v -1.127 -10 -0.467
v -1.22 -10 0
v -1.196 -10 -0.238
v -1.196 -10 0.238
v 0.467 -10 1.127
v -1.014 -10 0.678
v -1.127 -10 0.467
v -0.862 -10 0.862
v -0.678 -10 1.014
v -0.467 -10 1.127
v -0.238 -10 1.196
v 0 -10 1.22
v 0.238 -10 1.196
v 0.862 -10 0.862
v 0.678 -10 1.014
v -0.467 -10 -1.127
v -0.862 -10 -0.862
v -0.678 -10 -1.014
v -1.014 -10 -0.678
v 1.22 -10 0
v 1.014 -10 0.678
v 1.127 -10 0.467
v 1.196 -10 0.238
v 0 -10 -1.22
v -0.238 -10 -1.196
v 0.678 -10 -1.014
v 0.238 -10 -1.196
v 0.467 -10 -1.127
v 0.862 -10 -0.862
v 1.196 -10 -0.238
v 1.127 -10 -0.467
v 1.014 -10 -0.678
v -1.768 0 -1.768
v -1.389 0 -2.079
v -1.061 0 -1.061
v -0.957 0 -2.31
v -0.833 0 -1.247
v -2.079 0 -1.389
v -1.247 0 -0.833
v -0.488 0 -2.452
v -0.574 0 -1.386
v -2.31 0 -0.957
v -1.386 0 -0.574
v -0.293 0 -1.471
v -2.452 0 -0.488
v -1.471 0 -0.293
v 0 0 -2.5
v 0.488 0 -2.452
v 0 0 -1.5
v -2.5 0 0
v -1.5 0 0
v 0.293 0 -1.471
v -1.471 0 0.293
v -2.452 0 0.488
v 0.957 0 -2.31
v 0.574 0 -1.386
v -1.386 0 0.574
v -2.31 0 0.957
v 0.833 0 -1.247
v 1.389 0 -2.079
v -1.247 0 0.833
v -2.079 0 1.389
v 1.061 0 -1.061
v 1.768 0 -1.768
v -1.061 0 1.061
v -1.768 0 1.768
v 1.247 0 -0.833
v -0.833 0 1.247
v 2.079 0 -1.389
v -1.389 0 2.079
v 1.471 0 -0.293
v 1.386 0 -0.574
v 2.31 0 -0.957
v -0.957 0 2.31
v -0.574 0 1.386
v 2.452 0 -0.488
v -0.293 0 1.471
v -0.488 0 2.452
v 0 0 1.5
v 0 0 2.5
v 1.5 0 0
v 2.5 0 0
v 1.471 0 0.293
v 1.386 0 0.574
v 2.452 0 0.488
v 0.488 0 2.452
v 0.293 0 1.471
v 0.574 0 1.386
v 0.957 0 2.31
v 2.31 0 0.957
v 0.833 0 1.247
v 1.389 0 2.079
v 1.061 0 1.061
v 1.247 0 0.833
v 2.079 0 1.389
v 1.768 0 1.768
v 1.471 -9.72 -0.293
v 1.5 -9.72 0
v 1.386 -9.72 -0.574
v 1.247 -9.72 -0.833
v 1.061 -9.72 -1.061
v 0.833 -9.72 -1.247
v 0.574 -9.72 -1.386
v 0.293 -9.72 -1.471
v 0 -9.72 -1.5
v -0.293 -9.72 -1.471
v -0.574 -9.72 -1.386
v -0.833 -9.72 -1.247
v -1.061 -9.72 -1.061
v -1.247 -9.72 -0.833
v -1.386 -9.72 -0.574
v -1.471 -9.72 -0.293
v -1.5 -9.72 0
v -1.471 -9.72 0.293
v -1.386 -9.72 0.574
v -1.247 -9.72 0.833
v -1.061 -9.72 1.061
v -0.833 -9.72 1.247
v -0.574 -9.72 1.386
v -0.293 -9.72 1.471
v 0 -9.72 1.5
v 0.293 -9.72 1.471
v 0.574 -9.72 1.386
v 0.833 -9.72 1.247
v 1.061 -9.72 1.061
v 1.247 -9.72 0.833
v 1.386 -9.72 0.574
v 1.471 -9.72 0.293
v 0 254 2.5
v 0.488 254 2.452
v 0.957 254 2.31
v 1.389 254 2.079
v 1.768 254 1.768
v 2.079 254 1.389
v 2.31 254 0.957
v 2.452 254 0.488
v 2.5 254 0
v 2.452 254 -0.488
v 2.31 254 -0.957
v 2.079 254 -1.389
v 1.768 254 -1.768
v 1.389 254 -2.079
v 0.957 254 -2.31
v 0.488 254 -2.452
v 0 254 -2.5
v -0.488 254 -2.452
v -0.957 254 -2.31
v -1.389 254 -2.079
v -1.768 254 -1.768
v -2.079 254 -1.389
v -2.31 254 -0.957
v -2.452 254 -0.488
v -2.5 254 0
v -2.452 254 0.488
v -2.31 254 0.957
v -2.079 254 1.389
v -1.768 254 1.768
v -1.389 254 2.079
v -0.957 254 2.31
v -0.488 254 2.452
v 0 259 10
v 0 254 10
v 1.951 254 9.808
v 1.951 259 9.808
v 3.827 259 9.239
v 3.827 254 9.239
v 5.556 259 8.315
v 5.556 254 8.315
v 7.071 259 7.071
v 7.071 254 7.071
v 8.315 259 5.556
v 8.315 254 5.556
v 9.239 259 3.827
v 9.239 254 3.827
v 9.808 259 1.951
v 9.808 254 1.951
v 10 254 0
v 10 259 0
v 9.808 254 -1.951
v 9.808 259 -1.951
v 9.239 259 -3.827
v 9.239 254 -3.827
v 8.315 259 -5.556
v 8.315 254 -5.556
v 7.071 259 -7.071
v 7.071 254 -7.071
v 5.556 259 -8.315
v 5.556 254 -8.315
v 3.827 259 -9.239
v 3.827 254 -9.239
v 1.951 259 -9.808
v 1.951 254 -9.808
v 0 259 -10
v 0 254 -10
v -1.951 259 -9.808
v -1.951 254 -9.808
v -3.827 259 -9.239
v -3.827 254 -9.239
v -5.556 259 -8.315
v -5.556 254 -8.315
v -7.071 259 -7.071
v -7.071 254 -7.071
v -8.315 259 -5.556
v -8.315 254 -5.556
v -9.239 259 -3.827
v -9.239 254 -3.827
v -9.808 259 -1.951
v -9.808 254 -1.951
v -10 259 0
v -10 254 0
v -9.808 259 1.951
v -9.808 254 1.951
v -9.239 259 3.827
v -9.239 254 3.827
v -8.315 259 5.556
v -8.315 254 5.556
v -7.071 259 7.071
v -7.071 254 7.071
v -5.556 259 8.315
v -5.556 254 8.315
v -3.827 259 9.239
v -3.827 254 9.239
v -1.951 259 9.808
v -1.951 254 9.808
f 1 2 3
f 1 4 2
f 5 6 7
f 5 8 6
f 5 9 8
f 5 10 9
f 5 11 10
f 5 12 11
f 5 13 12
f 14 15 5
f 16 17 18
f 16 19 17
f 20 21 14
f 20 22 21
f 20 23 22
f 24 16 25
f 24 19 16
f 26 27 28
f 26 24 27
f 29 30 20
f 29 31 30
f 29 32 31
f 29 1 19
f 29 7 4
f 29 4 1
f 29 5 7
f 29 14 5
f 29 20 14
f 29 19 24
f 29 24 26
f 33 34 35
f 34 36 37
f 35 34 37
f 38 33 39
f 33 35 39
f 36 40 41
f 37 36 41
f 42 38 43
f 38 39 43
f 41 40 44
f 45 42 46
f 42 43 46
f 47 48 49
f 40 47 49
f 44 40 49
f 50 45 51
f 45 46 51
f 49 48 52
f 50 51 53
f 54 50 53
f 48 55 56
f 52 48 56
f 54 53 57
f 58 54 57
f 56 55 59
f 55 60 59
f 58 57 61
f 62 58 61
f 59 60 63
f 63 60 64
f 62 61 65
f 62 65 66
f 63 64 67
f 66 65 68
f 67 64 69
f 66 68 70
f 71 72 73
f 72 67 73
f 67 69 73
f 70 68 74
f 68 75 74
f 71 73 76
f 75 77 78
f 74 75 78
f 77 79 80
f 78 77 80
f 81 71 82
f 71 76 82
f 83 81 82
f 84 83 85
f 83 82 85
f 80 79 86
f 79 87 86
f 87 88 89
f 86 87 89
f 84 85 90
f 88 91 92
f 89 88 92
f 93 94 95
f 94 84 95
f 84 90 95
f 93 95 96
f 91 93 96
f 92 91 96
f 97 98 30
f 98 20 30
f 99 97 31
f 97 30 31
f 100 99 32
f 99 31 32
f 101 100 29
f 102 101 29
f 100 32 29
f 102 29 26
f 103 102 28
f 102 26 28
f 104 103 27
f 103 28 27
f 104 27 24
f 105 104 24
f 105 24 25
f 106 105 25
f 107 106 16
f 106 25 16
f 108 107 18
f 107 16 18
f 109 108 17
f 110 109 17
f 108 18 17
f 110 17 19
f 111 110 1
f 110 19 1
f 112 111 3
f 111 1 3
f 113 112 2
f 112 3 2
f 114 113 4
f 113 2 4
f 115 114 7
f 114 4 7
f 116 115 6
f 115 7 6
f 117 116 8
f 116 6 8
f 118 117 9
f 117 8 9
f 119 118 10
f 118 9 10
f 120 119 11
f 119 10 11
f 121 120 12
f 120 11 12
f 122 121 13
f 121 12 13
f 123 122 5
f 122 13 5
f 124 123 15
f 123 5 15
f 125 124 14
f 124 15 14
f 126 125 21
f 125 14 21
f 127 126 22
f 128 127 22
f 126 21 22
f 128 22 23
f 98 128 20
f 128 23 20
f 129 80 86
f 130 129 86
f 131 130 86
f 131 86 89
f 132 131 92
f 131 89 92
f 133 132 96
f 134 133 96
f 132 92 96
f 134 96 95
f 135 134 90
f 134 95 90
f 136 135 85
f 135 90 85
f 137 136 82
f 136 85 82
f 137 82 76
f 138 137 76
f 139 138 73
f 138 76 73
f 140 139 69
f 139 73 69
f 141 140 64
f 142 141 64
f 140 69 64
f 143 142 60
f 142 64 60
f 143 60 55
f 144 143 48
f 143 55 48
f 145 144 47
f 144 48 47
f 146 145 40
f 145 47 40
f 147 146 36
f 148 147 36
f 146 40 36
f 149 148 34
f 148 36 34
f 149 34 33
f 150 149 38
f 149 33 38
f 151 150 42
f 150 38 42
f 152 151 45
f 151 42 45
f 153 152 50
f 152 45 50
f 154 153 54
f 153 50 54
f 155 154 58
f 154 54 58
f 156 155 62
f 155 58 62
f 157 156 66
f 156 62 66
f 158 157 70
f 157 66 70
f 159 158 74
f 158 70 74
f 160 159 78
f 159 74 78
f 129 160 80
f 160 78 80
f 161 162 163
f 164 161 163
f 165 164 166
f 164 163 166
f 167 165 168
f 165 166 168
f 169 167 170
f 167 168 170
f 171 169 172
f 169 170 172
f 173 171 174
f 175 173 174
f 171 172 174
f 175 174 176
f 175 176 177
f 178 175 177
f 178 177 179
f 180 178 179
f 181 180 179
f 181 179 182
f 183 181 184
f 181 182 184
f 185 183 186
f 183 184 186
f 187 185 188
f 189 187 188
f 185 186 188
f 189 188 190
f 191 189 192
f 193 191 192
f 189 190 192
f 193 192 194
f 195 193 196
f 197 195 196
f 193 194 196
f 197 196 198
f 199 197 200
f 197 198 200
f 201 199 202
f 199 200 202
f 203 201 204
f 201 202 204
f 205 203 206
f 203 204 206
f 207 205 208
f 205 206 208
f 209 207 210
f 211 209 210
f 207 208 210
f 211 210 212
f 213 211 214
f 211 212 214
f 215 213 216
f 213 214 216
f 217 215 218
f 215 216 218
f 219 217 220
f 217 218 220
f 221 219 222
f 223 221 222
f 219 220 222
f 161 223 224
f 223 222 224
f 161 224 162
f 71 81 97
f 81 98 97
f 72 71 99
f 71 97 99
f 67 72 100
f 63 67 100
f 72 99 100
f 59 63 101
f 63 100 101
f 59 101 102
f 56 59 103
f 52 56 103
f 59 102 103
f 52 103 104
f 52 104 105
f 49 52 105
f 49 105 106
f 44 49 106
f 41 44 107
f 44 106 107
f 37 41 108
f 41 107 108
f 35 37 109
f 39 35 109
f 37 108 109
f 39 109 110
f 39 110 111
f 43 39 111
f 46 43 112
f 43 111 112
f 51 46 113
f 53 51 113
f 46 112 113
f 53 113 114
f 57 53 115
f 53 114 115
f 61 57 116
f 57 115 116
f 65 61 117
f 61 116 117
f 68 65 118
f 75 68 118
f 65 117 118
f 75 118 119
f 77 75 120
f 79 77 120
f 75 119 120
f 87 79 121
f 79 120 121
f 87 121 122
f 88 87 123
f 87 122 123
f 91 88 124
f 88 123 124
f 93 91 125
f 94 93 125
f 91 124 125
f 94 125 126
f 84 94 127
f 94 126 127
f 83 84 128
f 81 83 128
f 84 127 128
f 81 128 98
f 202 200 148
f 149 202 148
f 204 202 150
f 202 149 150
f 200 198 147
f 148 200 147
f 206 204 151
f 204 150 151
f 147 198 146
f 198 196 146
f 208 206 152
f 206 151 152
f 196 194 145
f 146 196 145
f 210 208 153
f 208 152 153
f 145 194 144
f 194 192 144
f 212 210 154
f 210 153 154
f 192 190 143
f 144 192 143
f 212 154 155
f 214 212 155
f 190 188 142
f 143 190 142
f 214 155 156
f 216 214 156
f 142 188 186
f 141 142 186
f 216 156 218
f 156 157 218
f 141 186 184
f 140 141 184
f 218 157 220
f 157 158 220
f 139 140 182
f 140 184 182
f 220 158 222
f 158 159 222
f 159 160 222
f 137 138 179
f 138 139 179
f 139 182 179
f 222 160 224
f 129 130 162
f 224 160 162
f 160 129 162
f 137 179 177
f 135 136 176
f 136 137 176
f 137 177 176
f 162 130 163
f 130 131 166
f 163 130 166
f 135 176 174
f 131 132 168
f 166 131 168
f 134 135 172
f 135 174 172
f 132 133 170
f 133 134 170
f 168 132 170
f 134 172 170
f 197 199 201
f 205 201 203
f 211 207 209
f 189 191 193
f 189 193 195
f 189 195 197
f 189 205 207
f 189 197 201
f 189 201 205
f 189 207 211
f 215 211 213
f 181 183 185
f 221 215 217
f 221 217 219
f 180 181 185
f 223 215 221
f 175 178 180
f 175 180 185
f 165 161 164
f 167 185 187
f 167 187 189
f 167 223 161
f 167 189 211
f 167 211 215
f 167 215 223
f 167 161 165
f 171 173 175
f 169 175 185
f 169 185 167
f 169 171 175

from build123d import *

# Parameters (mm, degrees)
SKETCH1_R           = 2.5
BOSS_EXTRUDE1_DEPTH = 254
SKETCH2_R           = 2
BOSS_EXTRUDE2_DEPTH = 10
SKETCH4_R           = 10
BOSS_EXTRUDE3_DEPTH = 5


# Read off the part's stored shape, not the designer's step: M3 Machine Threads Stud1
with BuildPart() as part:
    # Sketch1 → Boss-Extrude1 (new body)
    with BuildSketch(Plane(origin=(0, 0, 0), x_dir=(1, 0, 0), z_dir=(0, 1, 0))):
        with Locations(Location((0, 0, 0), (0, 0, 270))):
            Circle(SKETCH1_R)
    extrude(amount=BOSS_EXTRUDE1_DEPTH)

    # Sketch2 → Boss-Extrude2 (add)
    with BuildSketch(Plane.XZ):
        with Locations(Location((0, 0, 0), (0, 0, 270))):
            Circle(SKETCH2_R)
    extrude(amount=BOSS_EXTRUDE2_DEPTH)

    # M3 Machine Threads Stud1 outline → M3 Machine Threads Stud1 (revolve, cut)
    with BuildSketch(Plane.XY):
        Polygon((2, 0), (1.5, 0), (1.5, -9.7195), (1.2195, -10), (2, -10), align=None)
    revolve(axis=Axis((0, 0, 0), (0, 1, 0)), mode=Mode.SUBTRACT)

    # Sketch4 → Boss-Extrude3 (add)
    with BuildSketch(Plane(origin=(0, 254, 0), x_dir=(1, 0, 0), z_dir=(0, 1, 0))):
        with Locations(Location((0, 0, 0), (0, 0, 270))):
            Circle(SKETCH4_R)
    extrude(amount=BOSS_EXTRUDE3_DEPTH)


solid = part.part
